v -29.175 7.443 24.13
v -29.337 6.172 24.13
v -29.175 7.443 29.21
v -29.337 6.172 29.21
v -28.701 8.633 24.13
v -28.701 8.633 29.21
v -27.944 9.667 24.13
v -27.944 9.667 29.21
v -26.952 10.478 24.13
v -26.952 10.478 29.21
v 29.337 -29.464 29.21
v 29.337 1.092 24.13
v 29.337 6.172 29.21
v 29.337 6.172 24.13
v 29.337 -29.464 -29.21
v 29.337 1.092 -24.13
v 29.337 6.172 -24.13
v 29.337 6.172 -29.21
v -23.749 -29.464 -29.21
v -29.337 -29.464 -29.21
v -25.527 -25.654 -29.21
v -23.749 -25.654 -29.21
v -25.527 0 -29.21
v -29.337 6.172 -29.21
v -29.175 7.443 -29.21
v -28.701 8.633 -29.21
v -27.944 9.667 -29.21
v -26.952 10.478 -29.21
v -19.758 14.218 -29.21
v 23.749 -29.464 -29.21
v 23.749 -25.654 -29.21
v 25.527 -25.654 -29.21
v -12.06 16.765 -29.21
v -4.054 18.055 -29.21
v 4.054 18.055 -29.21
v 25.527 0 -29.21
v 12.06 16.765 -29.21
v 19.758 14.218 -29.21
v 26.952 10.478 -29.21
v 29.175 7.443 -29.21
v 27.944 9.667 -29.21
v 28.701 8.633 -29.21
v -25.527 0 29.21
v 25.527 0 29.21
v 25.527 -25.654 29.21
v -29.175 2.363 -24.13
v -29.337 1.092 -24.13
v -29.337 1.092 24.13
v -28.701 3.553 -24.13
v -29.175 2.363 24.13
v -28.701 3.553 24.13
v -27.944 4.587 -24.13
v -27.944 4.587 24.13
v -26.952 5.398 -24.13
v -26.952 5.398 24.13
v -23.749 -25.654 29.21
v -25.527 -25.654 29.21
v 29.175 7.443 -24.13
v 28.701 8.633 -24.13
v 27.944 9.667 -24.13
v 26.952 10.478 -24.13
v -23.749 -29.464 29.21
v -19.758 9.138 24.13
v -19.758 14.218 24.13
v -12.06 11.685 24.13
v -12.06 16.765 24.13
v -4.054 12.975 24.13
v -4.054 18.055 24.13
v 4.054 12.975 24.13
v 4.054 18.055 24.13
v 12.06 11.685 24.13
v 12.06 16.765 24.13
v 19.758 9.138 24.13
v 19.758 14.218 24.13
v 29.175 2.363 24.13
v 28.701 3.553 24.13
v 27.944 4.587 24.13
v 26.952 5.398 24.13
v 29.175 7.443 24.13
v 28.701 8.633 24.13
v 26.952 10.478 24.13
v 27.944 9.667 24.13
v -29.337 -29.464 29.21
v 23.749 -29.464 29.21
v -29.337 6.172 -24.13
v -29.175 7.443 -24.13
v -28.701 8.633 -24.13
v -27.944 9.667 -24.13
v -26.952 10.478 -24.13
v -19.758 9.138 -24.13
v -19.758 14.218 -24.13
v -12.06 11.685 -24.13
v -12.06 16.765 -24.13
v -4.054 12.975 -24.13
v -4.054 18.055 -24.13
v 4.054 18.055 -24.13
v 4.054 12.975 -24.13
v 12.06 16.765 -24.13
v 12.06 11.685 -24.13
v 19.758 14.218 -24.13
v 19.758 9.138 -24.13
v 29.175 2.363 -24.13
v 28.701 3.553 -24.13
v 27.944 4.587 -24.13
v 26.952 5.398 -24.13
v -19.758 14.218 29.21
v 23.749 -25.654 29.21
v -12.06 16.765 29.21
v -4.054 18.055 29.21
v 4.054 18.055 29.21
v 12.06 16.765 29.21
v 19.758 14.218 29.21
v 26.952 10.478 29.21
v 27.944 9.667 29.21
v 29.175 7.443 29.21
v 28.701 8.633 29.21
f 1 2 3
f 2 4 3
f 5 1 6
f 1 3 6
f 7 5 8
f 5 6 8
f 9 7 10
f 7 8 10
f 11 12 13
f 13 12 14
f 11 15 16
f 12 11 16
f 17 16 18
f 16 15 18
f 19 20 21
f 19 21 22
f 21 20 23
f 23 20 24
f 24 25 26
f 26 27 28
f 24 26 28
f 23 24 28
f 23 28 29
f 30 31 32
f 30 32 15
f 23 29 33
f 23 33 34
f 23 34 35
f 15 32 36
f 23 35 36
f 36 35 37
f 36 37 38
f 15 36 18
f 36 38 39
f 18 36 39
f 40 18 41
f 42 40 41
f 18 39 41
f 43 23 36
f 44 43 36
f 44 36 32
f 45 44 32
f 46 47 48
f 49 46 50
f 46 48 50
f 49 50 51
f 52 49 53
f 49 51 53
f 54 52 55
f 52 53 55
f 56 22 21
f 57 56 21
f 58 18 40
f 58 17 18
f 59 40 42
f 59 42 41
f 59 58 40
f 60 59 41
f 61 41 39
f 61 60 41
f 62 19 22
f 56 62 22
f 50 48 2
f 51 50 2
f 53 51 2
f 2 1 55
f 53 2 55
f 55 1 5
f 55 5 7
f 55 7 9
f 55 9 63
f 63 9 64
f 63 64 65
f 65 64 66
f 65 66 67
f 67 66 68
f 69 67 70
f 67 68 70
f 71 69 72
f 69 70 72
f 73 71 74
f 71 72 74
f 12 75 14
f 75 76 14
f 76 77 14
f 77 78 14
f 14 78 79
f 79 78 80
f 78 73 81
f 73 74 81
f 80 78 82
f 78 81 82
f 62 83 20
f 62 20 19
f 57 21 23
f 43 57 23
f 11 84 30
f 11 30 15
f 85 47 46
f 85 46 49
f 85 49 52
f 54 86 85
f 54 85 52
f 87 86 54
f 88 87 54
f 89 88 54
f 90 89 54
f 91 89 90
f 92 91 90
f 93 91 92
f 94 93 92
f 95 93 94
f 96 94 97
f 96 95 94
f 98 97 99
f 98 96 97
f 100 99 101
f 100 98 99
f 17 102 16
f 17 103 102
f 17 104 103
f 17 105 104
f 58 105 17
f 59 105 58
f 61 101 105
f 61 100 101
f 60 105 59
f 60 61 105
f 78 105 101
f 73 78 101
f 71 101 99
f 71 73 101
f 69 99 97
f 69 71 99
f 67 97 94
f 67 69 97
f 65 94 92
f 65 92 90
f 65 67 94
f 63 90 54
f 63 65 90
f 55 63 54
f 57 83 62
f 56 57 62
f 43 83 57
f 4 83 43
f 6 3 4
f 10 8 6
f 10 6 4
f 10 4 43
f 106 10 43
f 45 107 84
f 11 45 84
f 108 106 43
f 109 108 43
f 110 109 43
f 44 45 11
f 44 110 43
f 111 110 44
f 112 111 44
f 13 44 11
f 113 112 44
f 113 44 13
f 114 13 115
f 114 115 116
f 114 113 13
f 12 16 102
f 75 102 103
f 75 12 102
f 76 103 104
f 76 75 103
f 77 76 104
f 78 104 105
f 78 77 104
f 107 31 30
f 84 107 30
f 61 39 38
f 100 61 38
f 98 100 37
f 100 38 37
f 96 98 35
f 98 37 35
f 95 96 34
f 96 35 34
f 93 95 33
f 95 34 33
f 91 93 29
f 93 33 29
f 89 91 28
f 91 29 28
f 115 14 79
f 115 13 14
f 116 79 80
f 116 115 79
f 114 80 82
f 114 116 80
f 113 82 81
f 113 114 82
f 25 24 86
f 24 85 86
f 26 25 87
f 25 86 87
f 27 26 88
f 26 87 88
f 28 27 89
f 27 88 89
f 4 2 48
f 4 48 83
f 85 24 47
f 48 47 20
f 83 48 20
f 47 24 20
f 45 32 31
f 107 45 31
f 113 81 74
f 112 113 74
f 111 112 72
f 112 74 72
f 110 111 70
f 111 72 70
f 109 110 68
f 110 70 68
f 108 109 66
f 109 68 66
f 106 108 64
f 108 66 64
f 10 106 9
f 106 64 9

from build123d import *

# Parameters (mm, degrees)
BOSS_EXTRUDE1_DEPTH = 24.13
BOSS_EXTRUDE2_DEPTH = 5.08
LPATTERN1_COUNT     = 2
LPATTERN1_PITCH     = 53.34
FILLET1_R           = 5.08


with BuildPart() as part:
    # Sketch1 → Boss-Extrude1 (new, symmetric)
    with BuildSketch(Plane.XY):
        with BuildLine():
            Line((-25.527, 0), (25.527, 0))
            Line((25.527, 0), (25.527, -25.654))
            Line((25.527, -25.654), (23.749, -25.654))
            Line((23.749, -25.654), (23.749, -29.464))
            Line((23.749, -29.464), (29.337, -29.464))
            Line((29.337, -29.464), (29.337, 3.81))
            ThreePointArc((29.337, 3.81), (0, 13.137353219), (-29.337, 3.81))
            Line((-29.337, 3.81), (-29.337, -29.464))
            Line((-29.337, -29.464), (-23.749, -29.464))
            Line((-23.749, -29.464), (-23.749, -25.654))
            Line((-23.749, -25.654), (-25.527, -25.654))
            Line((-25.527, -25.654), (-25.527, 0))
        make_face()
    extrude(amount=BOSS_EXTRUDE1_DEPTH, both=True)

    # Sketch2 → Boss-Extrude2 (add)
    with BuildSketch(Plane.XY.offset(24.13)):
        with BuildLine():
            Line((29.337, -29.464), (29.337, 8.89))
            ThreePointArc((29.337, 8.89), (0, 18.217353219), (-29.337, 8.89))
            Line((-29.337, 8.89), (-29.337, -29.464))
            Line((-29.337, -29.464), (-23.749, -29.464))
            Line((-23.749, -29.464), (-23.749, -25.654))
            Line((-23.749, -25.654), (-25.527, -25.654))
            Line((-25.527, -25.654), (-25.527, 0))
            Line((-25.527, 0), (25.527, 0))
            Line((25.527, 0), (25.527, -25.654))
            Line((25.527, -25.654), (23.749, -25.654))
            Line((23.749, -25.654), (23.749, -29.464))
            Line((23.749, -29.464), (29.337, -29.464))
        make_face()
    boss_extrude2 = extrude(amount=BOSS_EXTRUDE2_DEPTH)

    # LPattern1: Boss-Extrude2 ×2
    with Locations(*[(0, 0, -i * LPATTERN1_PITCH) for i in range(1, LPATTERN1_COUNT)]):
        add(boss_extrude2)

    # Fillet1
    fillet1_edges = [part.edges().sort_by_distance(p)[0] for p in [
        (-29.337, 3.81, 0),
        (29.337, 3.81, 0),
        (29.337, 8.89, 26.67),
        (-29.337, 8.89, 26.67),
        (29.337, 8.89, -26.67),
        (-29.337, 8.89, -26.67),
    ]]
    fillet(fillet1_edges, radius=FILLET1_R)


solid = part.part
